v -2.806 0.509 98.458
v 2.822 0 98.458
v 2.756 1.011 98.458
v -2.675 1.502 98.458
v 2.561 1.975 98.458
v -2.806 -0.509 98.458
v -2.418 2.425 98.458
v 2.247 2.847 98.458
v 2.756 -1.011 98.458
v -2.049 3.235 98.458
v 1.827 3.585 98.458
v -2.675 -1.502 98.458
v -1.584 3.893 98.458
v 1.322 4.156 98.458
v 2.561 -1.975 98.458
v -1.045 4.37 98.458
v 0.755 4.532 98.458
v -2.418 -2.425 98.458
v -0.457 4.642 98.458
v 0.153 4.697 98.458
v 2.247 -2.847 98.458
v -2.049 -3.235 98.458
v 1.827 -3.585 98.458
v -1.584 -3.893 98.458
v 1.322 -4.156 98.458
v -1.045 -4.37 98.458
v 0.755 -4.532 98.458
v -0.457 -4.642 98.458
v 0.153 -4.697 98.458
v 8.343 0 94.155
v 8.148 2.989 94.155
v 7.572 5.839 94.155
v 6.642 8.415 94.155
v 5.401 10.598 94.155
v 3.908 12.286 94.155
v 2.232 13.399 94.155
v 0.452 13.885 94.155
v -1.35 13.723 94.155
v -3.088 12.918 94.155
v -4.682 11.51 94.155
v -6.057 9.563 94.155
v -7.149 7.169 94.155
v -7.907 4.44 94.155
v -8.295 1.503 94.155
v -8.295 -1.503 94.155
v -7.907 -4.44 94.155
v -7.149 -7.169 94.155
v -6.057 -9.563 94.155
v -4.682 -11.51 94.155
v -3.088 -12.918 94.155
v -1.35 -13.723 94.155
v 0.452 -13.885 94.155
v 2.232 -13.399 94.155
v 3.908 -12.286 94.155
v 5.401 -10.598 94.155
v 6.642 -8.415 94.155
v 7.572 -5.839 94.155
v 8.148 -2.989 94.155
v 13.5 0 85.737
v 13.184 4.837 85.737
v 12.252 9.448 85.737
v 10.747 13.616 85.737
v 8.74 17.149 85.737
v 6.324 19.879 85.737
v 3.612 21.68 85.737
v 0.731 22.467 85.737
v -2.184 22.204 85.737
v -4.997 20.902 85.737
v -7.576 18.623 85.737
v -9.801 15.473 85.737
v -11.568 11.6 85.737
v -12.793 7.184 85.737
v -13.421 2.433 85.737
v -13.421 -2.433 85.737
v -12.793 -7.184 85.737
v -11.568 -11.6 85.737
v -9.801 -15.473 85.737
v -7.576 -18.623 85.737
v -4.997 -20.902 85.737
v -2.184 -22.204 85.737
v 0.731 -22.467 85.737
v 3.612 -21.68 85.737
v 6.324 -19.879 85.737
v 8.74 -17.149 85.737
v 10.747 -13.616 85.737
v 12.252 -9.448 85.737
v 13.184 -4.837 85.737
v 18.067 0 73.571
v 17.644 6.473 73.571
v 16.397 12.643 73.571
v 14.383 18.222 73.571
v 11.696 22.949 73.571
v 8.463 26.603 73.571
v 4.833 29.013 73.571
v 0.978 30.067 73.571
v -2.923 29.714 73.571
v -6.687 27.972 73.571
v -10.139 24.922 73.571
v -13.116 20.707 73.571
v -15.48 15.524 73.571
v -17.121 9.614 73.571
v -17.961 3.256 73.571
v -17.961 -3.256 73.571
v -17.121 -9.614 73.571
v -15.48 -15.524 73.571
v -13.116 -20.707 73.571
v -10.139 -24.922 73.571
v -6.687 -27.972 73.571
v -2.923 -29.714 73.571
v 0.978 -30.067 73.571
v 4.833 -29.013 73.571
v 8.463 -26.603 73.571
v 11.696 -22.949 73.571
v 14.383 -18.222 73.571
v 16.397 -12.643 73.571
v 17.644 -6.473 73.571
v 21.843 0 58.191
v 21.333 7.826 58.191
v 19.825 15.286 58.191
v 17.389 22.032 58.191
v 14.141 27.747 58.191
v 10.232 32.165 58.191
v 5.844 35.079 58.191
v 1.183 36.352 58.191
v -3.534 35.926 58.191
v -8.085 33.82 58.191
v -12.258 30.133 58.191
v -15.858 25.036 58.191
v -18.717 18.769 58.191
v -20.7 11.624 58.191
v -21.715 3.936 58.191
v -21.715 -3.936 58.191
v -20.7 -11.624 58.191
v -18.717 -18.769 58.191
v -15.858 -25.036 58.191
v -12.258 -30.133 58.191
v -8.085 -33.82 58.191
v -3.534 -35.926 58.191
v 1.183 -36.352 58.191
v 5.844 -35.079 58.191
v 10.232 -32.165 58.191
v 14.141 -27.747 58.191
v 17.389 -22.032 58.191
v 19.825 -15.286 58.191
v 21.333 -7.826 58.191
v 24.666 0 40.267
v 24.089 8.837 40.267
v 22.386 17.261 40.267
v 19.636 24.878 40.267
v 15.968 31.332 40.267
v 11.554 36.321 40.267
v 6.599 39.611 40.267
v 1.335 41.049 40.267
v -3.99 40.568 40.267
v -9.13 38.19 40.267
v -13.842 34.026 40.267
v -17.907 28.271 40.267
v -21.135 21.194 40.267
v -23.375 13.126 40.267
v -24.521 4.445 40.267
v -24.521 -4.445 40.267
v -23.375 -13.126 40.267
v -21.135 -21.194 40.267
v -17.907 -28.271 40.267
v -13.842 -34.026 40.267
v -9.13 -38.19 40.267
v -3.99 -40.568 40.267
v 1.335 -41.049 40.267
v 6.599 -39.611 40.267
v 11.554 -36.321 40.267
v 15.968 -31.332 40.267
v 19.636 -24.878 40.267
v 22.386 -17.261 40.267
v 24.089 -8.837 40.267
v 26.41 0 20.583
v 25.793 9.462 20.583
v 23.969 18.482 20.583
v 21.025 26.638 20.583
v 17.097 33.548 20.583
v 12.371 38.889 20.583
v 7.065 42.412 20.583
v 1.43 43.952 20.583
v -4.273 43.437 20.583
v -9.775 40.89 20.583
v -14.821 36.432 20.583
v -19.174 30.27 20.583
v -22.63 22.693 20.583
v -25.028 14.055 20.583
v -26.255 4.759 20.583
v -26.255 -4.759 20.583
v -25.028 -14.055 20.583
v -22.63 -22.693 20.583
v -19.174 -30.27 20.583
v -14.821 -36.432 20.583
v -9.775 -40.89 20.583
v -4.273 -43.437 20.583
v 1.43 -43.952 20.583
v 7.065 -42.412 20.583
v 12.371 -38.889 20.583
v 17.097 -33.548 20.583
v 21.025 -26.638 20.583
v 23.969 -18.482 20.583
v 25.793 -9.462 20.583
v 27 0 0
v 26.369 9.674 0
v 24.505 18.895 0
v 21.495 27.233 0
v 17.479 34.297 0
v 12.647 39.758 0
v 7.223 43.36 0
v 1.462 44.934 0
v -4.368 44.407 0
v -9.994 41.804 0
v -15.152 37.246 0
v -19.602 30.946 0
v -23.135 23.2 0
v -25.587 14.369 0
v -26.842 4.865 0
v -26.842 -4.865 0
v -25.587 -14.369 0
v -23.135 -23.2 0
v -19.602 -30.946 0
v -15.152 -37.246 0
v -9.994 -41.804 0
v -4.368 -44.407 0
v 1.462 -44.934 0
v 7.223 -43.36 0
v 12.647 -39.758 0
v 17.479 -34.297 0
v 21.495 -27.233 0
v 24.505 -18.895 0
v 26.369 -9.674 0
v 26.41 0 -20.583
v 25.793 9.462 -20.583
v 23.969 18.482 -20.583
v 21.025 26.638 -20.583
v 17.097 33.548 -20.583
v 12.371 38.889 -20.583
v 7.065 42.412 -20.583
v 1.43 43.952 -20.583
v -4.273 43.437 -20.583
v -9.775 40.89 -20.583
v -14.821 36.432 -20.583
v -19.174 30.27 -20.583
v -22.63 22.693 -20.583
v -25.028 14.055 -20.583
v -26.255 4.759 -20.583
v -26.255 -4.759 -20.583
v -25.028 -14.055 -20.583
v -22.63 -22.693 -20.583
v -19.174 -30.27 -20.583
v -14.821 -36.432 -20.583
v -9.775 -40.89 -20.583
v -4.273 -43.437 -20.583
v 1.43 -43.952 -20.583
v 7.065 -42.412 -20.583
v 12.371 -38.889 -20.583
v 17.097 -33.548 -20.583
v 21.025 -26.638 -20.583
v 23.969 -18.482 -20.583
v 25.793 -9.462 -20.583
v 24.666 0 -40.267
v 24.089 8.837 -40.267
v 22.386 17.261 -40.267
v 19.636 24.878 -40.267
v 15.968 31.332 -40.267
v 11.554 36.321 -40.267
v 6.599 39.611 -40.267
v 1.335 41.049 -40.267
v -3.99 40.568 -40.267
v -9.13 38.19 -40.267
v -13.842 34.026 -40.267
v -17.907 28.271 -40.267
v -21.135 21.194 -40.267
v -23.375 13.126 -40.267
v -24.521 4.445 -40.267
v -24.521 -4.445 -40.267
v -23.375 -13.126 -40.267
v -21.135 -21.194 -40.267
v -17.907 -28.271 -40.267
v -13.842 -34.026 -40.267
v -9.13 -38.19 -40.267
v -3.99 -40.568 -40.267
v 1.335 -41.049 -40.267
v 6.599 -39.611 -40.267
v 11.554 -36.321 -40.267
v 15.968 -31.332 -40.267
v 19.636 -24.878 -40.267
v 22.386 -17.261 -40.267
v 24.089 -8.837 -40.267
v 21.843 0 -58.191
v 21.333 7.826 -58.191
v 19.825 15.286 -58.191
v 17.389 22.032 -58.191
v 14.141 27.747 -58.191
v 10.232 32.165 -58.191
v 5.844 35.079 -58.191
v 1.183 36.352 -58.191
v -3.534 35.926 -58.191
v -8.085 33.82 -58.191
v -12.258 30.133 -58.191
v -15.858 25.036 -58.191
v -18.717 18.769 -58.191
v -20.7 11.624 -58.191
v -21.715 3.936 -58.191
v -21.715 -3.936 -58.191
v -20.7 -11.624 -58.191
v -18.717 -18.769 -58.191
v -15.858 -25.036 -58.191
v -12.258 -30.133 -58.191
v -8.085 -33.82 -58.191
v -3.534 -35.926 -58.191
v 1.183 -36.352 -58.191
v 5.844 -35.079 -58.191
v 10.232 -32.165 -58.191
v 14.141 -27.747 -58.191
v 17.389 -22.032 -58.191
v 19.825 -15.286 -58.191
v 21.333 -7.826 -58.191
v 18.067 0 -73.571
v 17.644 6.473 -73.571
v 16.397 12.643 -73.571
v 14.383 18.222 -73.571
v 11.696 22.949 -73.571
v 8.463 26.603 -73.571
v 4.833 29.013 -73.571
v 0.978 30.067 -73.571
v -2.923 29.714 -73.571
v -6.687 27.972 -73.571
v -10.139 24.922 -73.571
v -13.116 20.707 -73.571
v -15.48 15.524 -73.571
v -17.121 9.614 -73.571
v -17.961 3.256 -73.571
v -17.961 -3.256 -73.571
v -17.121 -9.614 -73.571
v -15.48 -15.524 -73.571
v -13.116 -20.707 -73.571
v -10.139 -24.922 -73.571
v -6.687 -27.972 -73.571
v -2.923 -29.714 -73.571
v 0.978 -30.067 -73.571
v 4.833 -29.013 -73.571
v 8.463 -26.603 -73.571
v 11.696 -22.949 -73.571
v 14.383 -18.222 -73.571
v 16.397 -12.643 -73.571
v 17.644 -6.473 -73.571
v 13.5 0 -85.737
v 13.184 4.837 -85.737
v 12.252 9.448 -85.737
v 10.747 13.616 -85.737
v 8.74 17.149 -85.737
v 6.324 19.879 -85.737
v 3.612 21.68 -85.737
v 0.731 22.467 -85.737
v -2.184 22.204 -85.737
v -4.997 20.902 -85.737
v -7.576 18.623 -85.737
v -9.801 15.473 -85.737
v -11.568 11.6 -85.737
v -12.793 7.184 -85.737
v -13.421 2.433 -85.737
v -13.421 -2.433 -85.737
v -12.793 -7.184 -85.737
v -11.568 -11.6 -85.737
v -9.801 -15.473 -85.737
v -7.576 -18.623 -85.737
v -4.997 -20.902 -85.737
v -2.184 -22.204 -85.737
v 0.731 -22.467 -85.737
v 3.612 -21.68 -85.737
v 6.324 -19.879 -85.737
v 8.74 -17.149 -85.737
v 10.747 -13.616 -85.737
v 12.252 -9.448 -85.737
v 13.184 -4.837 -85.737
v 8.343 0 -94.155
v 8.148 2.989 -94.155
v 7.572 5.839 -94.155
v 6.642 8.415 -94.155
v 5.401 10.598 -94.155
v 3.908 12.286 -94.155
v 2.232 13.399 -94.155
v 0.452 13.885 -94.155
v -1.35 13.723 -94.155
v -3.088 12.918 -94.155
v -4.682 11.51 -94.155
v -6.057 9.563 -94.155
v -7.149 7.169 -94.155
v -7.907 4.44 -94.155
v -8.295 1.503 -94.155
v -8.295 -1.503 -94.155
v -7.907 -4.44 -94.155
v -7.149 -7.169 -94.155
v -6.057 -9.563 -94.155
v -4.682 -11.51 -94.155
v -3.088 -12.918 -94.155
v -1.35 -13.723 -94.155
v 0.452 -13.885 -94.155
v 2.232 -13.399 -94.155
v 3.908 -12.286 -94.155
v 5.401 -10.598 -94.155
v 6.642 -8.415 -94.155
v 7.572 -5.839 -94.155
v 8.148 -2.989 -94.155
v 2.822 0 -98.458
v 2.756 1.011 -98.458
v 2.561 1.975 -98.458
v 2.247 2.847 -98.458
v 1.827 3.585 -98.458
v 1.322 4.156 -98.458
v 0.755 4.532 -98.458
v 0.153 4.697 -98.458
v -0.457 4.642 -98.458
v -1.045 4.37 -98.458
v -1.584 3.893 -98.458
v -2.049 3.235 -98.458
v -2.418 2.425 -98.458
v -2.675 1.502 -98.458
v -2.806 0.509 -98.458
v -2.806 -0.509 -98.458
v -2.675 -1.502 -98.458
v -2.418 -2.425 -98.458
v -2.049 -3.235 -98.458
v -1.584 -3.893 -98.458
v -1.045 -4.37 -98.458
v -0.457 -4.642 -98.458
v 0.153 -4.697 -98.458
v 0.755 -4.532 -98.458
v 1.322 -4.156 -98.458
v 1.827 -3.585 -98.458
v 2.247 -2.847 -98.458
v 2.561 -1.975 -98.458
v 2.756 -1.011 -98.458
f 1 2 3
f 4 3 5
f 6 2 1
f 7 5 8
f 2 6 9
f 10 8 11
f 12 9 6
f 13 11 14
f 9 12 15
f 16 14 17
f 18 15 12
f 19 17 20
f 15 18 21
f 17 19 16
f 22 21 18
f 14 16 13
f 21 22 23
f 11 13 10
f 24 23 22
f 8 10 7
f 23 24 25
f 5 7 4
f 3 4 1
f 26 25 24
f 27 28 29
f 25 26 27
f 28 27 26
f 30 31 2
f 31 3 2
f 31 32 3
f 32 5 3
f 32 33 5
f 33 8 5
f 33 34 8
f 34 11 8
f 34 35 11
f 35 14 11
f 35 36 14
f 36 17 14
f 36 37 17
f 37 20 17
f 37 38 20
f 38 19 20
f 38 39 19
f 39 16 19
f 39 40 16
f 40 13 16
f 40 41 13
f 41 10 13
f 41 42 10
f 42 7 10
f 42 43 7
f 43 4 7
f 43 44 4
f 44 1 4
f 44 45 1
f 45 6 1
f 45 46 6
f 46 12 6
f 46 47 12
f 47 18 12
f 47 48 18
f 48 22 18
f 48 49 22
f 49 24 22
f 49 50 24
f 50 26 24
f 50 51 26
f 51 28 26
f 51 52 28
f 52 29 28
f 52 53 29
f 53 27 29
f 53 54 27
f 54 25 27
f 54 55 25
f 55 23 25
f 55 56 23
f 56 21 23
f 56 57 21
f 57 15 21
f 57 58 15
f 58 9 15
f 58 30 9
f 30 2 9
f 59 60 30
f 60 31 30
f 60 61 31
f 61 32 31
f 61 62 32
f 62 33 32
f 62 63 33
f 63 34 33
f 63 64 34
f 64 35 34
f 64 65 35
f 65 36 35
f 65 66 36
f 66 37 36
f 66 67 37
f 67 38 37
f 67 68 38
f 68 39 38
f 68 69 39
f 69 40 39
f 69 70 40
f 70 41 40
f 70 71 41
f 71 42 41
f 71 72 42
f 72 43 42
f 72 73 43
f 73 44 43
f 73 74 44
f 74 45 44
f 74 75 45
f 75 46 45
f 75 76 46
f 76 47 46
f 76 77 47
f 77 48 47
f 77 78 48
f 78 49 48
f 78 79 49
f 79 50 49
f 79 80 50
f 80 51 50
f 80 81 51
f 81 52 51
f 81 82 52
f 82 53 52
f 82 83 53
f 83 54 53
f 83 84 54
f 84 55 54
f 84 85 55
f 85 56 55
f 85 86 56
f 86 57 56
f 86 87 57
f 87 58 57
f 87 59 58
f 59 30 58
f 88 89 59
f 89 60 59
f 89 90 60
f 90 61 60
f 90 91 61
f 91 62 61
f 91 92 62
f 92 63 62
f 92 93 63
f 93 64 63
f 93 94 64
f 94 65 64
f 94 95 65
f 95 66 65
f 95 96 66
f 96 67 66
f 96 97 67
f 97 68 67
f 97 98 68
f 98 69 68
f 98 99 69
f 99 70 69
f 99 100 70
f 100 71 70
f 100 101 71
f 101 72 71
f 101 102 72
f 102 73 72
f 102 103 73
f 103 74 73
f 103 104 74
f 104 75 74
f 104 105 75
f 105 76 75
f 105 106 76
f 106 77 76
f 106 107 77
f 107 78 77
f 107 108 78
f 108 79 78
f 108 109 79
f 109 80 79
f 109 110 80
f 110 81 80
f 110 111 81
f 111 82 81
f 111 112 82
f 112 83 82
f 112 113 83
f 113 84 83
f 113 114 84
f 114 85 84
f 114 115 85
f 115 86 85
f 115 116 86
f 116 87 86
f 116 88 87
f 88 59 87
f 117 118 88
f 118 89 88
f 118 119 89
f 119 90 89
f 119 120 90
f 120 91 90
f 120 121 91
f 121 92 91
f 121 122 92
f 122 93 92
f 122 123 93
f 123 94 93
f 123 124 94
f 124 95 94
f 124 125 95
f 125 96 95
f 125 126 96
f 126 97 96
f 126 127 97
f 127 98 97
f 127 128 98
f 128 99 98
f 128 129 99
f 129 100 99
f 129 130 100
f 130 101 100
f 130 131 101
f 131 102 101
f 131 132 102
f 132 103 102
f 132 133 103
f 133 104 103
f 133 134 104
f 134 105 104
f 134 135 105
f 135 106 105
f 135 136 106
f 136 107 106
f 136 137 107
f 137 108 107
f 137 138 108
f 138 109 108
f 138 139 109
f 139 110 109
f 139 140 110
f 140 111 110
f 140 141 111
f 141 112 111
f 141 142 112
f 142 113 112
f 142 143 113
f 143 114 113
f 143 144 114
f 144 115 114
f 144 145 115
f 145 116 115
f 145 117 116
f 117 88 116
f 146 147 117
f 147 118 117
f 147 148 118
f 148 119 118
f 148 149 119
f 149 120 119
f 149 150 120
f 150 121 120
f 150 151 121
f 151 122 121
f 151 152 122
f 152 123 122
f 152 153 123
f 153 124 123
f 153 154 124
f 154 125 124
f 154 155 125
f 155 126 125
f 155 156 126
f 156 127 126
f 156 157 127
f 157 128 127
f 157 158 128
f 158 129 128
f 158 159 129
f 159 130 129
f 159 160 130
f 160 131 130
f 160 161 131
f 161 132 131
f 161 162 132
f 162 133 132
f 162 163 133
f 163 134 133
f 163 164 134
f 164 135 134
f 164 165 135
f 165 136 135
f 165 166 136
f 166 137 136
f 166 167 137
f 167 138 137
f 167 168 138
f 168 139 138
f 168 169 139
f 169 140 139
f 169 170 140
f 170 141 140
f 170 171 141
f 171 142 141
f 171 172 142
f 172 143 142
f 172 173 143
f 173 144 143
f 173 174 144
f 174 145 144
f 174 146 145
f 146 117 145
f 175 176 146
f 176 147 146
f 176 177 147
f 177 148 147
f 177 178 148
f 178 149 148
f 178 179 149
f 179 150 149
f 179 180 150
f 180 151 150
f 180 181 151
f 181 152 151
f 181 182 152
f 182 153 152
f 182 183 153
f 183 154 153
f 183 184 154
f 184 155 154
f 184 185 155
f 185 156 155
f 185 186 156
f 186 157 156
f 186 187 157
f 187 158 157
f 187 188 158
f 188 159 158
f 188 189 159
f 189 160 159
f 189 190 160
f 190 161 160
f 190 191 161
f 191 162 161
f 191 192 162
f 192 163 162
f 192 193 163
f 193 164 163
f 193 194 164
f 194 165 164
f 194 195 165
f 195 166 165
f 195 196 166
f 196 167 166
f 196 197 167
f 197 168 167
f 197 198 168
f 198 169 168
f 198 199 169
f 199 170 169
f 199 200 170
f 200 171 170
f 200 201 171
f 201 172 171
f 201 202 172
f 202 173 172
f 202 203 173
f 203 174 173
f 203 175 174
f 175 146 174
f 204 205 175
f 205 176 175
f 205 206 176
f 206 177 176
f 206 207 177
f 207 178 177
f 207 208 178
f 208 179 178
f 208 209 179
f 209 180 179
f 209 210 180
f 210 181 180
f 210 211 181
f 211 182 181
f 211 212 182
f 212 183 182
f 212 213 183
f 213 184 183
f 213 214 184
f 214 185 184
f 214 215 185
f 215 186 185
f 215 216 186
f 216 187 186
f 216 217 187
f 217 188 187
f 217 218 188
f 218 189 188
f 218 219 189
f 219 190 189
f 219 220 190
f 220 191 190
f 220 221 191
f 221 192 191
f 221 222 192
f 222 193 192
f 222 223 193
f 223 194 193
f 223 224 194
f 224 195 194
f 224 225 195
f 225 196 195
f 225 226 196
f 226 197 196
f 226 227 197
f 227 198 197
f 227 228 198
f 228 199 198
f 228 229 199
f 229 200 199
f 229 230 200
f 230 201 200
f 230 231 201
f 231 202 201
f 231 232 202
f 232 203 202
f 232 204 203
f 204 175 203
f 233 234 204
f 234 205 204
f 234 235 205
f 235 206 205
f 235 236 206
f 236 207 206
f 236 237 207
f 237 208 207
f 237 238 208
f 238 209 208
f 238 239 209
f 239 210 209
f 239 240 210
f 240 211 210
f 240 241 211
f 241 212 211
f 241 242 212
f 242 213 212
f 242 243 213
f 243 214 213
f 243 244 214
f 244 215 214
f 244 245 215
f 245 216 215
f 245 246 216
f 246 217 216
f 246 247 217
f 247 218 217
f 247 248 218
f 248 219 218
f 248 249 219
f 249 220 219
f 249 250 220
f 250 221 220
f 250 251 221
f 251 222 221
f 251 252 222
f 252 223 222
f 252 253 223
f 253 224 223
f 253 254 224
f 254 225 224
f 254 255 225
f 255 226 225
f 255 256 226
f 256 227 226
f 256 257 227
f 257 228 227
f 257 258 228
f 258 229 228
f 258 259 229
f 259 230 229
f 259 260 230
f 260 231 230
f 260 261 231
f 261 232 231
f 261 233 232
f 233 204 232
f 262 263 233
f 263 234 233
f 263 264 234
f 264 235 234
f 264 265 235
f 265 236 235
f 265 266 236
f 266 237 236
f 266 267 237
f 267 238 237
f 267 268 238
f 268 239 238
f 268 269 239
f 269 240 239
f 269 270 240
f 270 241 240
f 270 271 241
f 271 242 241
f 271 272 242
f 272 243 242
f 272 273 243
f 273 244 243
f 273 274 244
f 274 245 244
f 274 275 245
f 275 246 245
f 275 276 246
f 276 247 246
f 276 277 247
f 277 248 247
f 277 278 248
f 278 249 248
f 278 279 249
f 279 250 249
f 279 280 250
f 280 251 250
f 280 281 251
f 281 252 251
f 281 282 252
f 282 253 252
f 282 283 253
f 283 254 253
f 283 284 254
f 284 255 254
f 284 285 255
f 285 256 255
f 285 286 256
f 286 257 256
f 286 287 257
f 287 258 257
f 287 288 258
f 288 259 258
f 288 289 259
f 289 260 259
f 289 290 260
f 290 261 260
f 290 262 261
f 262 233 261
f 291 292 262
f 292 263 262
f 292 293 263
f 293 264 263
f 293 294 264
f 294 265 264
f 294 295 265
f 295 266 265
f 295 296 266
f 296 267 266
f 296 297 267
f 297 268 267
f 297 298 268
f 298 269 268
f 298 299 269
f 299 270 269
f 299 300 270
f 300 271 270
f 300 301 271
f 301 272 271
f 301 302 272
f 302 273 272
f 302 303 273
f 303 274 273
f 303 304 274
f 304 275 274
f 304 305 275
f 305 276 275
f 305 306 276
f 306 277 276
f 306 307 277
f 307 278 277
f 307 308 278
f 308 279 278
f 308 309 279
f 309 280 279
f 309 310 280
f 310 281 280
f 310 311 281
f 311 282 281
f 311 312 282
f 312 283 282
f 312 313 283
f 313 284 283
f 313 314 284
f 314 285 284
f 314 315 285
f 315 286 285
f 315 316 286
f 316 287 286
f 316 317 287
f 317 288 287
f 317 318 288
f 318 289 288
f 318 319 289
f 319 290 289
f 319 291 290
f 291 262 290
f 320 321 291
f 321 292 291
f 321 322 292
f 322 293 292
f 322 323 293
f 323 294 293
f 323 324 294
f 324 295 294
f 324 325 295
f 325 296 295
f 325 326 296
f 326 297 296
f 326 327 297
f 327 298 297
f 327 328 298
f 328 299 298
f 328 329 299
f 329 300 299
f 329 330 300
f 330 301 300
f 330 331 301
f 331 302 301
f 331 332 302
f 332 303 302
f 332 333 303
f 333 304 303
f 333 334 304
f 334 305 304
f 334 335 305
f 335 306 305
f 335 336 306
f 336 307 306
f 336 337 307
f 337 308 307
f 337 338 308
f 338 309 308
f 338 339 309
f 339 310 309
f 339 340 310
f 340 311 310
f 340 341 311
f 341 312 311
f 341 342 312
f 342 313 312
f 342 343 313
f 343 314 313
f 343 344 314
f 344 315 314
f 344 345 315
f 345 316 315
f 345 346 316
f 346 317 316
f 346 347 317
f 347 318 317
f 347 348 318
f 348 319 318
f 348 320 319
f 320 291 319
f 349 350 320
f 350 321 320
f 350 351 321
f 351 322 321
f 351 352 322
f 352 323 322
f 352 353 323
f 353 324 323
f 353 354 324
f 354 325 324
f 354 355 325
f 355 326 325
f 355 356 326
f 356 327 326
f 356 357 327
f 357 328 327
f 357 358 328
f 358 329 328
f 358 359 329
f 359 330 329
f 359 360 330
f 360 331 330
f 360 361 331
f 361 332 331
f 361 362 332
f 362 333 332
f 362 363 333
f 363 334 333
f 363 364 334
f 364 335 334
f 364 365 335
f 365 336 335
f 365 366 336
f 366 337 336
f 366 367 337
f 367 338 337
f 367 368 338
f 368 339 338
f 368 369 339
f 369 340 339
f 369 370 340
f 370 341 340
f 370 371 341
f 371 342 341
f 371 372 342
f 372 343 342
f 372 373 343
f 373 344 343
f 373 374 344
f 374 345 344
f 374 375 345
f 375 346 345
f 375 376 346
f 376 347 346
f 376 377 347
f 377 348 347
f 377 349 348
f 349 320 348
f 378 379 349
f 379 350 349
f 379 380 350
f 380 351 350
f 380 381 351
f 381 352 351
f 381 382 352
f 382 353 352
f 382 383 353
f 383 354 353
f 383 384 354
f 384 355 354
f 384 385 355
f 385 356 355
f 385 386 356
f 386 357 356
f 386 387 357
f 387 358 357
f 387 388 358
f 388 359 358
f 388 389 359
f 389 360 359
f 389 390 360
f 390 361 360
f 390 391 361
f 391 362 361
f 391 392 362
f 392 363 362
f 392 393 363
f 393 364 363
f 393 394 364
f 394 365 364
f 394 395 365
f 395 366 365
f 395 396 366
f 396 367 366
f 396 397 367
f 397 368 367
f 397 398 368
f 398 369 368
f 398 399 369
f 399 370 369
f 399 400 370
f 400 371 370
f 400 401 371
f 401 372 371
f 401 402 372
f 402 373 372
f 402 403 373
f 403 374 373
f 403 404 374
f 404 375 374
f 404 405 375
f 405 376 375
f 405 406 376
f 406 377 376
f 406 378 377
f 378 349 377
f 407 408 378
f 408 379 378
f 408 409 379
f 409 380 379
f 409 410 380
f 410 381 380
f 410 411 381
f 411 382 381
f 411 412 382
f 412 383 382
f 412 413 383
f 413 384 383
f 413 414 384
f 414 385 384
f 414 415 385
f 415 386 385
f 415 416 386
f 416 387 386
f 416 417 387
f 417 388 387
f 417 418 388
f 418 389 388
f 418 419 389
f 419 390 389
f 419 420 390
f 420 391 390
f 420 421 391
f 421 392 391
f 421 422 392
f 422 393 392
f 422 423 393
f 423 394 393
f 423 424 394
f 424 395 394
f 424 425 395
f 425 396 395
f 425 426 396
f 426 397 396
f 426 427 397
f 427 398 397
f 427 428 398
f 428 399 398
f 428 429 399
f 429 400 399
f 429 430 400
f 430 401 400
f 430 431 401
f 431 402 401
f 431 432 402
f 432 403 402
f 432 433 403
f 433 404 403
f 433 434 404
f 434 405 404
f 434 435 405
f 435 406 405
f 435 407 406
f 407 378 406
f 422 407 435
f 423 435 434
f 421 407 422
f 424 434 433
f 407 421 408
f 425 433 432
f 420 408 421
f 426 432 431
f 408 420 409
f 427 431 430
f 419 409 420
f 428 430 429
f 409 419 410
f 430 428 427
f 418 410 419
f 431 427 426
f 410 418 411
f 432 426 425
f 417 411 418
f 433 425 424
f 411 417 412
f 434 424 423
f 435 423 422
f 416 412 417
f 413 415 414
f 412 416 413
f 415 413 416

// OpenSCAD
// Generated by SolidPython 1.0.1 on 2020-07-29 00:46:45


scale(v = [3, 5, 11]) {
	sphere(r = 9);
}
/***********************************************
*********      SolidPython code:      **********
************************************************
 
# import packages: SolidPython
from solid import *
from solid.utils import *
from itertools import chain, combinations, permutations


class Resize:

    def __init__(self, scad_file):
        self.scad_file = scad_file
        #self.scad_file = import_scad(scad_file)
        # cone/cylinder param:
        self.r1 = 0
        self.r2 = 0
        self.h = 0
        # rectangular prism param:
        self.w = 0
        self.l = 0
        # ellipse param:
        self.r = 0

    # import OpenScad code (file name corresponds to shape)


    # classify shape + parameters
    def assign(self, param1, param2, param3):
        if self.scad_file == 'cone.scad':
            self.r1 = param1
            self.r2 = param2
            self.h = param3
        elif self.scad_file == 'cylinder.scad':
            self.r1 = param1
            self.r2 = param2
            self.h = param3
        elif self.scad_file == 'rectangularPrism.scad':
            self.h = param1
            self.l = param2
            self.w = param3
        else:
            self.r = param1
            self.h = param2

    # resize parameters
    def iterate(self):
        x = range(3, 20, 2)
        i = 1
        if self.scad_file == 'cone.scad':
            tempList = list(permutations(x, 2))
            for temp in tempList:
                param1 = temp[0]
                param2 = temp[1]
                filepath = 'produced_scad_files/' + 'cone' + str(param1) + '_' + str(param2) + '_' + '.scad'
                scad_render_to_file(cylinder(h=param1, r1=param2, r2=0), filepath)

        elif self.scad_file == 'cylinder.scad':
            tempList = list(permutations(x, 3))
            for temp in tempList:
                param1 = temp[0]
                param2 = temp[1]
                filepath = 'produced_scad_files/' + 'cylinder' + str(param1) + '_' + str(param2) + '_' + '.scad'
                scad_render_to_file(cylinder(h=param1, r1=param2, r2=param2), filepath)

        elif self.scad_file == 'rectangularPrism.scad':
            tempList = list(permutations(x, 3))
            for temp in tempList:
                param1 = temp[0]
                param2 = temp[1]
                param3 = temp[2]
                filepath = 'produced_scad_files/' + 'rectangularPrism' + str(param1) + '_' + str(param2) + '_' + str(
                    param3) + '.scad'
                scad_render_to_file(cube(size=(param1, param2, param3)), filepath)

        elif self.scad_file == 'ellipse.scad':
            tempList = list(permutations(x, 4))
            for temp in tempList:
                param1 = temp[0]
                param2 = temp[1]
                param3 = temp[2]
                param4 = temp[3]
                filepath = 'produced_scad_files/' + 'ellipse' + str(param1) + '_' + str(param2) + '_' + str(param3) + '_' + str(param4) + '.scad'
                scad_render_to_file(scale([param1, param2, param3])(sphere(r=param4)), filepath)

    def render_to_scadfile(self):
        scad_render_to_file(scad, 'example.scad') 
 
************************************************/
